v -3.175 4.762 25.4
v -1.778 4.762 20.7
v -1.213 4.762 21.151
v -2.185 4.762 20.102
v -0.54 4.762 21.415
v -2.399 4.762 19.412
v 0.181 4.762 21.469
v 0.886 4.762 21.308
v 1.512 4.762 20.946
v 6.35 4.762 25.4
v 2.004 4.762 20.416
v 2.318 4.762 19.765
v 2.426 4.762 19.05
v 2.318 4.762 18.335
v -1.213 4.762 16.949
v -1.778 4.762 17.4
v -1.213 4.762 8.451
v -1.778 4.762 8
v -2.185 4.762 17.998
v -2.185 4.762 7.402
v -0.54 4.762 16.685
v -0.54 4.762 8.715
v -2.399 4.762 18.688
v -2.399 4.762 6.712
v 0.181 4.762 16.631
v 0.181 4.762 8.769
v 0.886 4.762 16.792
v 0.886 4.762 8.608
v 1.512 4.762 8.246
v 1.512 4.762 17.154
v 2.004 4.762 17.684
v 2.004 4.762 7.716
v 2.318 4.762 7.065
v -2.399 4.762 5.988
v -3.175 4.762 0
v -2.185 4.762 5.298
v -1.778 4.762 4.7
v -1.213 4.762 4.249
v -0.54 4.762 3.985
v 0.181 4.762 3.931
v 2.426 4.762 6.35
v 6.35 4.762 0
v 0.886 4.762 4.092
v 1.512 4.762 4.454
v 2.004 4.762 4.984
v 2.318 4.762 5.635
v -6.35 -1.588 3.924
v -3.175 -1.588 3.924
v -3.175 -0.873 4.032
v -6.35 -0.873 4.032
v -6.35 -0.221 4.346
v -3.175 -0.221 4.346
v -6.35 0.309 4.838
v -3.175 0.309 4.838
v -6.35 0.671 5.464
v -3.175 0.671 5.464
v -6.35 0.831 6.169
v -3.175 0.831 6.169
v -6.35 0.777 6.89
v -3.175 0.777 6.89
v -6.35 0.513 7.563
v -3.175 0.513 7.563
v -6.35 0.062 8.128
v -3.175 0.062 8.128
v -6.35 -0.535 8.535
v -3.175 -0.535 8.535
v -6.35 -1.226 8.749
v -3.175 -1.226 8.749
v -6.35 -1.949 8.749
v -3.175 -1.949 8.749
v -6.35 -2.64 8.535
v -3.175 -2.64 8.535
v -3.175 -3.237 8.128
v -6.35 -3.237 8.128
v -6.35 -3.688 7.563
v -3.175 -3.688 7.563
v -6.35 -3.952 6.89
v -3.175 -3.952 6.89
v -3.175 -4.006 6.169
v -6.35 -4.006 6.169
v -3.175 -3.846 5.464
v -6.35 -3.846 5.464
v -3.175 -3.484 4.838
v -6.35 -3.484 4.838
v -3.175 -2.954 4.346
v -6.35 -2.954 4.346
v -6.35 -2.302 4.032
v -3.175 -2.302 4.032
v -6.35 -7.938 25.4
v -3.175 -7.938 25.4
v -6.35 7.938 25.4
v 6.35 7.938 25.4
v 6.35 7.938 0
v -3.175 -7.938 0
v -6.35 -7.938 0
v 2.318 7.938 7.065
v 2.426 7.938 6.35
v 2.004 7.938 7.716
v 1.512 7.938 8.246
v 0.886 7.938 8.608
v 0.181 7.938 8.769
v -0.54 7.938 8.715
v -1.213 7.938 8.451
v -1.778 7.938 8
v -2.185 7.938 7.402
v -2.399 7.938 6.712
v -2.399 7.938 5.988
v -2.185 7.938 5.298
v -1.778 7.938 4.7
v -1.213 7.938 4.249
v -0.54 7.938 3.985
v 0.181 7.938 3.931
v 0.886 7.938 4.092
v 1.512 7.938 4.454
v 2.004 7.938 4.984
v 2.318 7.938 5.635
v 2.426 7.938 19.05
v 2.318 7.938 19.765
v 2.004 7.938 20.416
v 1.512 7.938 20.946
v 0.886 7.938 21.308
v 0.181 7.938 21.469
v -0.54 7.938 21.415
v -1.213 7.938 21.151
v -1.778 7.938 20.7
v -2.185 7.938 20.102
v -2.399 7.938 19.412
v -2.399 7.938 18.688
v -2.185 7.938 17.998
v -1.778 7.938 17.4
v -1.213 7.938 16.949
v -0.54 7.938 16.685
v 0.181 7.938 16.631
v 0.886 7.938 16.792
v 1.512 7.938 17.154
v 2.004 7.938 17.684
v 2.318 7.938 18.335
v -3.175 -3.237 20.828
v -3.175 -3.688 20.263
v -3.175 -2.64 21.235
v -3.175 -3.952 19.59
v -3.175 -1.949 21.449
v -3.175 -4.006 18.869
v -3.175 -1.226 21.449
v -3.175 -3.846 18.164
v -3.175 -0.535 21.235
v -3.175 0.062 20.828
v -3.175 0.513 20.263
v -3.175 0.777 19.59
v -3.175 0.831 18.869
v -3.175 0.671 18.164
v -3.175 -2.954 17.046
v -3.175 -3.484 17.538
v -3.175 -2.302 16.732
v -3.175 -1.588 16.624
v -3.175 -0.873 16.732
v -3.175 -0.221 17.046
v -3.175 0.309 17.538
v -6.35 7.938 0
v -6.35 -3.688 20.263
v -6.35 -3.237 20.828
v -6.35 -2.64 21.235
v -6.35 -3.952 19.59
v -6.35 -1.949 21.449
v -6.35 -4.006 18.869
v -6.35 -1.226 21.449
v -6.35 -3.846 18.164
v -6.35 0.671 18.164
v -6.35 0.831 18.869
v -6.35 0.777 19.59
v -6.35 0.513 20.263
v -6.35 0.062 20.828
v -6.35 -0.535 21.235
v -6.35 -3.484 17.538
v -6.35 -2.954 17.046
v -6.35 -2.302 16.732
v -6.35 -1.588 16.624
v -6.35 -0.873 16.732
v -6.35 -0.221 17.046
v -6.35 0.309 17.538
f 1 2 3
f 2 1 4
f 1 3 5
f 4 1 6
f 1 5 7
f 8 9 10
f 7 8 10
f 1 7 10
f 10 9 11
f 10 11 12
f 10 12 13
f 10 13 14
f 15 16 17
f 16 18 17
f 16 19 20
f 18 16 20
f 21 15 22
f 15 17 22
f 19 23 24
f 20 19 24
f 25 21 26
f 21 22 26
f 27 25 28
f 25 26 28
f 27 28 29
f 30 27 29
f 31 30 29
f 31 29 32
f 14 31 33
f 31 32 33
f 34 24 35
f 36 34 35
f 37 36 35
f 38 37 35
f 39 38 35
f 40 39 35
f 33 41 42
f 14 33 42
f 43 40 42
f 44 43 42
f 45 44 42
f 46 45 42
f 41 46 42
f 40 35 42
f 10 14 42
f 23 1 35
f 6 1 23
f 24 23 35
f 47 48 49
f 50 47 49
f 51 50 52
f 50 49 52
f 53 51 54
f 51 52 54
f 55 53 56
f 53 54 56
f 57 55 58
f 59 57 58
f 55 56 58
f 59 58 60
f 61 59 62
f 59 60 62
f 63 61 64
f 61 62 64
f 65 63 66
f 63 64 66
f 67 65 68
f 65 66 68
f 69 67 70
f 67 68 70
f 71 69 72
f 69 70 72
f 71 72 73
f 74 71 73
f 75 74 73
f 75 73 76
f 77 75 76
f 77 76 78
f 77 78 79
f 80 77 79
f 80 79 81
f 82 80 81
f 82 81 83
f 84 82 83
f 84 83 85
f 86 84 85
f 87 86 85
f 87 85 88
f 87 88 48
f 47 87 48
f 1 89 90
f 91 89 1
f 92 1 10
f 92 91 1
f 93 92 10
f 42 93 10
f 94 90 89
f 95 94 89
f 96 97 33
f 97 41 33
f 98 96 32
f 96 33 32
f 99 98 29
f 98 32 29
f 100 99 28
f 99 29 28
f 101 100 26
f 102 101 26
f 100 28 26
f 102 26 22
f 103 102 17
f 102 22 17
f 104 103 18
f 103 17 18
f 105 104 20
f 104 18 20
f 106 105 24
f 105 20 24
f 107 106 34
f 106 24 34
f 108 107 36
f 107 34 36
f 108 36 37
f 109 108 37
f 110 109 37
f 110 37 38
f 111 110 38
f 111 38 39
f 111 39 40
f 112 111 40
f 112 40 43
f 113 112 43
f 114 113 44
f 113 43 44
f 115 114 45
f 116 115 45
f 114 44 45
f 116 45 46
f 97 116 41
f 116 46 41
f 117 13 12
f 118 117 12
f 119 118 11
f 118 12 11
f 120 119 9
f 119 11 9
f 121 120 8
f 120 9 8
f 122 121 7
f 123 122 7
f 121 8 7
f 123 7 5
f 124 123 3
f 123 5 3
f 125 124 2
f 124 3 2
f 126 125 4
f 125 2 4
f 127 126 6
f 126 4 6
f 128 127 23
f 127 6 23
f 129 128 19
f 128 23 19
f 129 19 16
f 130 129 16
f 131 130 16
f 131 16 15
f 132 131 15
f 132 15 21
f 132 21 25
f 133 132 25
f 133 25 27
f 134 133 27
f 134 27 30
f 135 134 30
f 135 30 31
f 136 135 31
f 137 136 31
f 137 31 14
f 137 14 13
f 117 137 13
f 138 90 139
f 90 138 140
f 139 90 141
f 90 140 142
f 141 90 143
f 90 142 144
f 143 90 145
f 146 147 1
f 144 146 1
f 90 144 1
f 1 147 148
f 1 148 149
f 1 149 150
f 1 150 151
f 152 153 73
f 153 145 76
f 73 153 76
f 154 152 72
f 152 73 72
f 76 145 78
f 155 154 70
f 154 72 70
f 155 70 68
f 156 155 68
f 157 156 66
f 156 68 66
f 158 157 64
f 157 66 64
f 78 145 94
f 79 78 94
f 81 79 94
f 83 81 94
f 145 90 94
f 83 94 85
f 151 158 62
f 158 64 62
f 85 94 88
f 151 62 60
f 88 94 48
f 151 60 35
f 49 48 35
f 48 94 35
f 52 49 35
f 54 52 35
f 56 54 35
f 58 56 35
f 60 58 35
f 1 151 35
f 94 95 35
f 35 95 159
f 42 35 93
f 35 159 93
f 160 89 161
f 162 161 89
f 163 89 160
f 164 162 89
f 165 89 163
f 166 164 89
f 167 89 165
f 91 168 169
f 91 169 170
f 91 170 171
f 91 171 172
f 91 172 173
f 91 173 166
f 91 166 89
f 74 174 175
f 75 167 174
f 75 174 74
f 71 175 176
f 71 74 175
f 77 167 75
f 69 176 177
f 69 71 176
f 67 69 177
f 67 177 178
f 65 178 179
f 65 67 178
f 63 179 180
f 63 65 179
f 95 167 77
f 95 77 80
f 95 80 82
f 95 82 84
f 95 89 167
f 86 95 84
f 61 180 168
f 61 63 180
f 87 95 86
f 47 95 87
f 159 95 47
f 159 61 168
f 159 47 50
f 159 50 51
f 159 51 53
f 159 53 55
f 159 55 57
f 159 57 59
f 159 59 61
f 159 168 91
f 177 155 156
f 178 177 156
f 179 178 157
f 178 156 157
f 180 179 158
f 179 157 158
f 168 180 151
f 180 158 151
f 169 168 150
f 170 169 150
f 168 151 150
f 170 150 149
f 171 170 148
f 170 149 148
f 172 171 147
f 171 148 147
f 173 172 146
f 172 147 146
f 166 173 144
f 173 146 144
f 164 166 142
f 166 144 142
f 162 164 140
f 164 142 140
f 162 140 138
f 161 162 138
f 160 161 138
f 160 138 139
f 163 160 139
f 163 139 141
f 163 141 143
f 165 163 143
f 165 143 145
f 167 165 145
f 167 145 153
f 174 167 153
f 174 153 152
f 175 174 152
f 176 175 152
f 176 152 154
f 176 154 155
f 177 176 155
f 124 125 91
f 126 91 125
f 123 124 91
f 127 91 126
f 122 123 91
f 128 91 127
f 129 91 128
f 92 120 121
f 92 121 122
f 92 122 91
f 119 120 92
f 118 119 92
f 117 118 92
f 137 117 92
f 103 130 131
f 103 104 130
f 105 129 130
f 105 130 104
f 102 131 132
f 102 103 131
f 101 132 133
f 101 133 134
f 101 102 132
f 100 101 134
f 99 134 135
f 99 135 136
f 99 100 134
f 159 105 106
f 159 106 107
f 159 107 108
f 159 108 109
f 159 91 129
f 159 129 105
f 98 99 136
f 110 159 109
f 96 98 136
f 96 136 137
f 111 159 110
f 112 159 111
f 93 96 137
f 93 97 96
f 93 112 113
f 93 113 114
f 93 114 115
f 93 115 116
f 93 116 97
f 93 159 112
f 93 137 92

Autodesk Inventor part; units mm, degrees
ref_plane "YZ Plane" through (0, 0, 0) normal (1, 0, 0) x (0, 1, 0)
ref_plane "XZ Plane" through (0, 0, 0) normal (0, 1, 0) x (-1, 0, 0)
ref_plane "XY Plane" through (0, 0, 0) normal (0, 0, 1) x (1, 0, 0)
sketch "Sketch1" plane through (0, 0, 0) normal (0, 0, 1) x (1, 0, 0)
  line L0 (6.35, -7.9375) -> (-6.35, -7.9375)
  line L1 (-6.35, -7.9375) -> (-6.35, 7.9375)
  line L2 (-6.35, 7.9375) -> (6.35, 7.9375)
  line L3 (6.35, 7.9375) -> (6.35, -7.9375)
  line L4 (6.35, -7.9375) -> (-6.35, 7.9375) construction
  line L5 (-6.35, -7.9375) -> (6.35, 7.9375) construction
  line L6 (6.35, -7.9375) -> (-3.175, -7.9375)
  line L7 (-3.175, -7.9375) -> (-3.175, 4.7625)
  line L8 (-3.175, 4.7625) -> (6.35, 4.7625)
  line L9 (6.35, 4.7625) -> (6.35, -7.9375)
  point P0 (0, 0)
  point P1 (-3.175, -7.9375)
  dimension "d0" = 12.7
  dimension "d1" = 15.875
  dimension "d2" = 9.525
  dimension "d3" = 12.7
extrude "Extrusion1" add sketch "Sketch1" along normal blind 25.4 contours L0 L1 L2 L3 L8 L7
sketch "Sketch2" plane through (-3.175, 4.7625, 0) normal (0, -1, 0) x (1, 0, 0)
  circle A0 centre (3.175, 19.05) radius 2.4257
  circle A1 centre (3.175, 6.35) radius 2.4257
  line L0 (0, 25.4) -> (9.525, 25.4) projected
  line L1 (0, 0) -> (9.525, 0) projected
  point P0 (3.175, 0)
  point P1 (4.7625, 25.4)
  dimension "d6" = 4.8514
  dimension "d7" = 4.8514
  dimension "d8" = 6.35
  dimension "d9" = 6.35
extrude "Extrusion2" cut sketch "Sketch2" against normal blind 25.4
sketch "Sketch3" plane through (-3.175, -7.9375, 0) normal (1, 0, 0) x (0, 0, -1)
  circle A0 centre (-6.35, 6.35) radius 2.4257
  circle A1 centre (-19.05, 6.35) radius 2.4257
  line L0 (-25.4, 0) -> (-25.4, 12.7) projected
  line L1 (0, 0) -> (0, 12.7) projected
  point P0 (0, 7.9375)
  dimension "d12" = 4.8514
  dimension "d13" = 4.8514
  dimension "d14" = 6.35
  dimension "d15" = 6.35
extrude "Extrusion3" cut sketch "Sketch3" against normal blind 25.4
properties part number "Gusset" material "Stainless Steel"
